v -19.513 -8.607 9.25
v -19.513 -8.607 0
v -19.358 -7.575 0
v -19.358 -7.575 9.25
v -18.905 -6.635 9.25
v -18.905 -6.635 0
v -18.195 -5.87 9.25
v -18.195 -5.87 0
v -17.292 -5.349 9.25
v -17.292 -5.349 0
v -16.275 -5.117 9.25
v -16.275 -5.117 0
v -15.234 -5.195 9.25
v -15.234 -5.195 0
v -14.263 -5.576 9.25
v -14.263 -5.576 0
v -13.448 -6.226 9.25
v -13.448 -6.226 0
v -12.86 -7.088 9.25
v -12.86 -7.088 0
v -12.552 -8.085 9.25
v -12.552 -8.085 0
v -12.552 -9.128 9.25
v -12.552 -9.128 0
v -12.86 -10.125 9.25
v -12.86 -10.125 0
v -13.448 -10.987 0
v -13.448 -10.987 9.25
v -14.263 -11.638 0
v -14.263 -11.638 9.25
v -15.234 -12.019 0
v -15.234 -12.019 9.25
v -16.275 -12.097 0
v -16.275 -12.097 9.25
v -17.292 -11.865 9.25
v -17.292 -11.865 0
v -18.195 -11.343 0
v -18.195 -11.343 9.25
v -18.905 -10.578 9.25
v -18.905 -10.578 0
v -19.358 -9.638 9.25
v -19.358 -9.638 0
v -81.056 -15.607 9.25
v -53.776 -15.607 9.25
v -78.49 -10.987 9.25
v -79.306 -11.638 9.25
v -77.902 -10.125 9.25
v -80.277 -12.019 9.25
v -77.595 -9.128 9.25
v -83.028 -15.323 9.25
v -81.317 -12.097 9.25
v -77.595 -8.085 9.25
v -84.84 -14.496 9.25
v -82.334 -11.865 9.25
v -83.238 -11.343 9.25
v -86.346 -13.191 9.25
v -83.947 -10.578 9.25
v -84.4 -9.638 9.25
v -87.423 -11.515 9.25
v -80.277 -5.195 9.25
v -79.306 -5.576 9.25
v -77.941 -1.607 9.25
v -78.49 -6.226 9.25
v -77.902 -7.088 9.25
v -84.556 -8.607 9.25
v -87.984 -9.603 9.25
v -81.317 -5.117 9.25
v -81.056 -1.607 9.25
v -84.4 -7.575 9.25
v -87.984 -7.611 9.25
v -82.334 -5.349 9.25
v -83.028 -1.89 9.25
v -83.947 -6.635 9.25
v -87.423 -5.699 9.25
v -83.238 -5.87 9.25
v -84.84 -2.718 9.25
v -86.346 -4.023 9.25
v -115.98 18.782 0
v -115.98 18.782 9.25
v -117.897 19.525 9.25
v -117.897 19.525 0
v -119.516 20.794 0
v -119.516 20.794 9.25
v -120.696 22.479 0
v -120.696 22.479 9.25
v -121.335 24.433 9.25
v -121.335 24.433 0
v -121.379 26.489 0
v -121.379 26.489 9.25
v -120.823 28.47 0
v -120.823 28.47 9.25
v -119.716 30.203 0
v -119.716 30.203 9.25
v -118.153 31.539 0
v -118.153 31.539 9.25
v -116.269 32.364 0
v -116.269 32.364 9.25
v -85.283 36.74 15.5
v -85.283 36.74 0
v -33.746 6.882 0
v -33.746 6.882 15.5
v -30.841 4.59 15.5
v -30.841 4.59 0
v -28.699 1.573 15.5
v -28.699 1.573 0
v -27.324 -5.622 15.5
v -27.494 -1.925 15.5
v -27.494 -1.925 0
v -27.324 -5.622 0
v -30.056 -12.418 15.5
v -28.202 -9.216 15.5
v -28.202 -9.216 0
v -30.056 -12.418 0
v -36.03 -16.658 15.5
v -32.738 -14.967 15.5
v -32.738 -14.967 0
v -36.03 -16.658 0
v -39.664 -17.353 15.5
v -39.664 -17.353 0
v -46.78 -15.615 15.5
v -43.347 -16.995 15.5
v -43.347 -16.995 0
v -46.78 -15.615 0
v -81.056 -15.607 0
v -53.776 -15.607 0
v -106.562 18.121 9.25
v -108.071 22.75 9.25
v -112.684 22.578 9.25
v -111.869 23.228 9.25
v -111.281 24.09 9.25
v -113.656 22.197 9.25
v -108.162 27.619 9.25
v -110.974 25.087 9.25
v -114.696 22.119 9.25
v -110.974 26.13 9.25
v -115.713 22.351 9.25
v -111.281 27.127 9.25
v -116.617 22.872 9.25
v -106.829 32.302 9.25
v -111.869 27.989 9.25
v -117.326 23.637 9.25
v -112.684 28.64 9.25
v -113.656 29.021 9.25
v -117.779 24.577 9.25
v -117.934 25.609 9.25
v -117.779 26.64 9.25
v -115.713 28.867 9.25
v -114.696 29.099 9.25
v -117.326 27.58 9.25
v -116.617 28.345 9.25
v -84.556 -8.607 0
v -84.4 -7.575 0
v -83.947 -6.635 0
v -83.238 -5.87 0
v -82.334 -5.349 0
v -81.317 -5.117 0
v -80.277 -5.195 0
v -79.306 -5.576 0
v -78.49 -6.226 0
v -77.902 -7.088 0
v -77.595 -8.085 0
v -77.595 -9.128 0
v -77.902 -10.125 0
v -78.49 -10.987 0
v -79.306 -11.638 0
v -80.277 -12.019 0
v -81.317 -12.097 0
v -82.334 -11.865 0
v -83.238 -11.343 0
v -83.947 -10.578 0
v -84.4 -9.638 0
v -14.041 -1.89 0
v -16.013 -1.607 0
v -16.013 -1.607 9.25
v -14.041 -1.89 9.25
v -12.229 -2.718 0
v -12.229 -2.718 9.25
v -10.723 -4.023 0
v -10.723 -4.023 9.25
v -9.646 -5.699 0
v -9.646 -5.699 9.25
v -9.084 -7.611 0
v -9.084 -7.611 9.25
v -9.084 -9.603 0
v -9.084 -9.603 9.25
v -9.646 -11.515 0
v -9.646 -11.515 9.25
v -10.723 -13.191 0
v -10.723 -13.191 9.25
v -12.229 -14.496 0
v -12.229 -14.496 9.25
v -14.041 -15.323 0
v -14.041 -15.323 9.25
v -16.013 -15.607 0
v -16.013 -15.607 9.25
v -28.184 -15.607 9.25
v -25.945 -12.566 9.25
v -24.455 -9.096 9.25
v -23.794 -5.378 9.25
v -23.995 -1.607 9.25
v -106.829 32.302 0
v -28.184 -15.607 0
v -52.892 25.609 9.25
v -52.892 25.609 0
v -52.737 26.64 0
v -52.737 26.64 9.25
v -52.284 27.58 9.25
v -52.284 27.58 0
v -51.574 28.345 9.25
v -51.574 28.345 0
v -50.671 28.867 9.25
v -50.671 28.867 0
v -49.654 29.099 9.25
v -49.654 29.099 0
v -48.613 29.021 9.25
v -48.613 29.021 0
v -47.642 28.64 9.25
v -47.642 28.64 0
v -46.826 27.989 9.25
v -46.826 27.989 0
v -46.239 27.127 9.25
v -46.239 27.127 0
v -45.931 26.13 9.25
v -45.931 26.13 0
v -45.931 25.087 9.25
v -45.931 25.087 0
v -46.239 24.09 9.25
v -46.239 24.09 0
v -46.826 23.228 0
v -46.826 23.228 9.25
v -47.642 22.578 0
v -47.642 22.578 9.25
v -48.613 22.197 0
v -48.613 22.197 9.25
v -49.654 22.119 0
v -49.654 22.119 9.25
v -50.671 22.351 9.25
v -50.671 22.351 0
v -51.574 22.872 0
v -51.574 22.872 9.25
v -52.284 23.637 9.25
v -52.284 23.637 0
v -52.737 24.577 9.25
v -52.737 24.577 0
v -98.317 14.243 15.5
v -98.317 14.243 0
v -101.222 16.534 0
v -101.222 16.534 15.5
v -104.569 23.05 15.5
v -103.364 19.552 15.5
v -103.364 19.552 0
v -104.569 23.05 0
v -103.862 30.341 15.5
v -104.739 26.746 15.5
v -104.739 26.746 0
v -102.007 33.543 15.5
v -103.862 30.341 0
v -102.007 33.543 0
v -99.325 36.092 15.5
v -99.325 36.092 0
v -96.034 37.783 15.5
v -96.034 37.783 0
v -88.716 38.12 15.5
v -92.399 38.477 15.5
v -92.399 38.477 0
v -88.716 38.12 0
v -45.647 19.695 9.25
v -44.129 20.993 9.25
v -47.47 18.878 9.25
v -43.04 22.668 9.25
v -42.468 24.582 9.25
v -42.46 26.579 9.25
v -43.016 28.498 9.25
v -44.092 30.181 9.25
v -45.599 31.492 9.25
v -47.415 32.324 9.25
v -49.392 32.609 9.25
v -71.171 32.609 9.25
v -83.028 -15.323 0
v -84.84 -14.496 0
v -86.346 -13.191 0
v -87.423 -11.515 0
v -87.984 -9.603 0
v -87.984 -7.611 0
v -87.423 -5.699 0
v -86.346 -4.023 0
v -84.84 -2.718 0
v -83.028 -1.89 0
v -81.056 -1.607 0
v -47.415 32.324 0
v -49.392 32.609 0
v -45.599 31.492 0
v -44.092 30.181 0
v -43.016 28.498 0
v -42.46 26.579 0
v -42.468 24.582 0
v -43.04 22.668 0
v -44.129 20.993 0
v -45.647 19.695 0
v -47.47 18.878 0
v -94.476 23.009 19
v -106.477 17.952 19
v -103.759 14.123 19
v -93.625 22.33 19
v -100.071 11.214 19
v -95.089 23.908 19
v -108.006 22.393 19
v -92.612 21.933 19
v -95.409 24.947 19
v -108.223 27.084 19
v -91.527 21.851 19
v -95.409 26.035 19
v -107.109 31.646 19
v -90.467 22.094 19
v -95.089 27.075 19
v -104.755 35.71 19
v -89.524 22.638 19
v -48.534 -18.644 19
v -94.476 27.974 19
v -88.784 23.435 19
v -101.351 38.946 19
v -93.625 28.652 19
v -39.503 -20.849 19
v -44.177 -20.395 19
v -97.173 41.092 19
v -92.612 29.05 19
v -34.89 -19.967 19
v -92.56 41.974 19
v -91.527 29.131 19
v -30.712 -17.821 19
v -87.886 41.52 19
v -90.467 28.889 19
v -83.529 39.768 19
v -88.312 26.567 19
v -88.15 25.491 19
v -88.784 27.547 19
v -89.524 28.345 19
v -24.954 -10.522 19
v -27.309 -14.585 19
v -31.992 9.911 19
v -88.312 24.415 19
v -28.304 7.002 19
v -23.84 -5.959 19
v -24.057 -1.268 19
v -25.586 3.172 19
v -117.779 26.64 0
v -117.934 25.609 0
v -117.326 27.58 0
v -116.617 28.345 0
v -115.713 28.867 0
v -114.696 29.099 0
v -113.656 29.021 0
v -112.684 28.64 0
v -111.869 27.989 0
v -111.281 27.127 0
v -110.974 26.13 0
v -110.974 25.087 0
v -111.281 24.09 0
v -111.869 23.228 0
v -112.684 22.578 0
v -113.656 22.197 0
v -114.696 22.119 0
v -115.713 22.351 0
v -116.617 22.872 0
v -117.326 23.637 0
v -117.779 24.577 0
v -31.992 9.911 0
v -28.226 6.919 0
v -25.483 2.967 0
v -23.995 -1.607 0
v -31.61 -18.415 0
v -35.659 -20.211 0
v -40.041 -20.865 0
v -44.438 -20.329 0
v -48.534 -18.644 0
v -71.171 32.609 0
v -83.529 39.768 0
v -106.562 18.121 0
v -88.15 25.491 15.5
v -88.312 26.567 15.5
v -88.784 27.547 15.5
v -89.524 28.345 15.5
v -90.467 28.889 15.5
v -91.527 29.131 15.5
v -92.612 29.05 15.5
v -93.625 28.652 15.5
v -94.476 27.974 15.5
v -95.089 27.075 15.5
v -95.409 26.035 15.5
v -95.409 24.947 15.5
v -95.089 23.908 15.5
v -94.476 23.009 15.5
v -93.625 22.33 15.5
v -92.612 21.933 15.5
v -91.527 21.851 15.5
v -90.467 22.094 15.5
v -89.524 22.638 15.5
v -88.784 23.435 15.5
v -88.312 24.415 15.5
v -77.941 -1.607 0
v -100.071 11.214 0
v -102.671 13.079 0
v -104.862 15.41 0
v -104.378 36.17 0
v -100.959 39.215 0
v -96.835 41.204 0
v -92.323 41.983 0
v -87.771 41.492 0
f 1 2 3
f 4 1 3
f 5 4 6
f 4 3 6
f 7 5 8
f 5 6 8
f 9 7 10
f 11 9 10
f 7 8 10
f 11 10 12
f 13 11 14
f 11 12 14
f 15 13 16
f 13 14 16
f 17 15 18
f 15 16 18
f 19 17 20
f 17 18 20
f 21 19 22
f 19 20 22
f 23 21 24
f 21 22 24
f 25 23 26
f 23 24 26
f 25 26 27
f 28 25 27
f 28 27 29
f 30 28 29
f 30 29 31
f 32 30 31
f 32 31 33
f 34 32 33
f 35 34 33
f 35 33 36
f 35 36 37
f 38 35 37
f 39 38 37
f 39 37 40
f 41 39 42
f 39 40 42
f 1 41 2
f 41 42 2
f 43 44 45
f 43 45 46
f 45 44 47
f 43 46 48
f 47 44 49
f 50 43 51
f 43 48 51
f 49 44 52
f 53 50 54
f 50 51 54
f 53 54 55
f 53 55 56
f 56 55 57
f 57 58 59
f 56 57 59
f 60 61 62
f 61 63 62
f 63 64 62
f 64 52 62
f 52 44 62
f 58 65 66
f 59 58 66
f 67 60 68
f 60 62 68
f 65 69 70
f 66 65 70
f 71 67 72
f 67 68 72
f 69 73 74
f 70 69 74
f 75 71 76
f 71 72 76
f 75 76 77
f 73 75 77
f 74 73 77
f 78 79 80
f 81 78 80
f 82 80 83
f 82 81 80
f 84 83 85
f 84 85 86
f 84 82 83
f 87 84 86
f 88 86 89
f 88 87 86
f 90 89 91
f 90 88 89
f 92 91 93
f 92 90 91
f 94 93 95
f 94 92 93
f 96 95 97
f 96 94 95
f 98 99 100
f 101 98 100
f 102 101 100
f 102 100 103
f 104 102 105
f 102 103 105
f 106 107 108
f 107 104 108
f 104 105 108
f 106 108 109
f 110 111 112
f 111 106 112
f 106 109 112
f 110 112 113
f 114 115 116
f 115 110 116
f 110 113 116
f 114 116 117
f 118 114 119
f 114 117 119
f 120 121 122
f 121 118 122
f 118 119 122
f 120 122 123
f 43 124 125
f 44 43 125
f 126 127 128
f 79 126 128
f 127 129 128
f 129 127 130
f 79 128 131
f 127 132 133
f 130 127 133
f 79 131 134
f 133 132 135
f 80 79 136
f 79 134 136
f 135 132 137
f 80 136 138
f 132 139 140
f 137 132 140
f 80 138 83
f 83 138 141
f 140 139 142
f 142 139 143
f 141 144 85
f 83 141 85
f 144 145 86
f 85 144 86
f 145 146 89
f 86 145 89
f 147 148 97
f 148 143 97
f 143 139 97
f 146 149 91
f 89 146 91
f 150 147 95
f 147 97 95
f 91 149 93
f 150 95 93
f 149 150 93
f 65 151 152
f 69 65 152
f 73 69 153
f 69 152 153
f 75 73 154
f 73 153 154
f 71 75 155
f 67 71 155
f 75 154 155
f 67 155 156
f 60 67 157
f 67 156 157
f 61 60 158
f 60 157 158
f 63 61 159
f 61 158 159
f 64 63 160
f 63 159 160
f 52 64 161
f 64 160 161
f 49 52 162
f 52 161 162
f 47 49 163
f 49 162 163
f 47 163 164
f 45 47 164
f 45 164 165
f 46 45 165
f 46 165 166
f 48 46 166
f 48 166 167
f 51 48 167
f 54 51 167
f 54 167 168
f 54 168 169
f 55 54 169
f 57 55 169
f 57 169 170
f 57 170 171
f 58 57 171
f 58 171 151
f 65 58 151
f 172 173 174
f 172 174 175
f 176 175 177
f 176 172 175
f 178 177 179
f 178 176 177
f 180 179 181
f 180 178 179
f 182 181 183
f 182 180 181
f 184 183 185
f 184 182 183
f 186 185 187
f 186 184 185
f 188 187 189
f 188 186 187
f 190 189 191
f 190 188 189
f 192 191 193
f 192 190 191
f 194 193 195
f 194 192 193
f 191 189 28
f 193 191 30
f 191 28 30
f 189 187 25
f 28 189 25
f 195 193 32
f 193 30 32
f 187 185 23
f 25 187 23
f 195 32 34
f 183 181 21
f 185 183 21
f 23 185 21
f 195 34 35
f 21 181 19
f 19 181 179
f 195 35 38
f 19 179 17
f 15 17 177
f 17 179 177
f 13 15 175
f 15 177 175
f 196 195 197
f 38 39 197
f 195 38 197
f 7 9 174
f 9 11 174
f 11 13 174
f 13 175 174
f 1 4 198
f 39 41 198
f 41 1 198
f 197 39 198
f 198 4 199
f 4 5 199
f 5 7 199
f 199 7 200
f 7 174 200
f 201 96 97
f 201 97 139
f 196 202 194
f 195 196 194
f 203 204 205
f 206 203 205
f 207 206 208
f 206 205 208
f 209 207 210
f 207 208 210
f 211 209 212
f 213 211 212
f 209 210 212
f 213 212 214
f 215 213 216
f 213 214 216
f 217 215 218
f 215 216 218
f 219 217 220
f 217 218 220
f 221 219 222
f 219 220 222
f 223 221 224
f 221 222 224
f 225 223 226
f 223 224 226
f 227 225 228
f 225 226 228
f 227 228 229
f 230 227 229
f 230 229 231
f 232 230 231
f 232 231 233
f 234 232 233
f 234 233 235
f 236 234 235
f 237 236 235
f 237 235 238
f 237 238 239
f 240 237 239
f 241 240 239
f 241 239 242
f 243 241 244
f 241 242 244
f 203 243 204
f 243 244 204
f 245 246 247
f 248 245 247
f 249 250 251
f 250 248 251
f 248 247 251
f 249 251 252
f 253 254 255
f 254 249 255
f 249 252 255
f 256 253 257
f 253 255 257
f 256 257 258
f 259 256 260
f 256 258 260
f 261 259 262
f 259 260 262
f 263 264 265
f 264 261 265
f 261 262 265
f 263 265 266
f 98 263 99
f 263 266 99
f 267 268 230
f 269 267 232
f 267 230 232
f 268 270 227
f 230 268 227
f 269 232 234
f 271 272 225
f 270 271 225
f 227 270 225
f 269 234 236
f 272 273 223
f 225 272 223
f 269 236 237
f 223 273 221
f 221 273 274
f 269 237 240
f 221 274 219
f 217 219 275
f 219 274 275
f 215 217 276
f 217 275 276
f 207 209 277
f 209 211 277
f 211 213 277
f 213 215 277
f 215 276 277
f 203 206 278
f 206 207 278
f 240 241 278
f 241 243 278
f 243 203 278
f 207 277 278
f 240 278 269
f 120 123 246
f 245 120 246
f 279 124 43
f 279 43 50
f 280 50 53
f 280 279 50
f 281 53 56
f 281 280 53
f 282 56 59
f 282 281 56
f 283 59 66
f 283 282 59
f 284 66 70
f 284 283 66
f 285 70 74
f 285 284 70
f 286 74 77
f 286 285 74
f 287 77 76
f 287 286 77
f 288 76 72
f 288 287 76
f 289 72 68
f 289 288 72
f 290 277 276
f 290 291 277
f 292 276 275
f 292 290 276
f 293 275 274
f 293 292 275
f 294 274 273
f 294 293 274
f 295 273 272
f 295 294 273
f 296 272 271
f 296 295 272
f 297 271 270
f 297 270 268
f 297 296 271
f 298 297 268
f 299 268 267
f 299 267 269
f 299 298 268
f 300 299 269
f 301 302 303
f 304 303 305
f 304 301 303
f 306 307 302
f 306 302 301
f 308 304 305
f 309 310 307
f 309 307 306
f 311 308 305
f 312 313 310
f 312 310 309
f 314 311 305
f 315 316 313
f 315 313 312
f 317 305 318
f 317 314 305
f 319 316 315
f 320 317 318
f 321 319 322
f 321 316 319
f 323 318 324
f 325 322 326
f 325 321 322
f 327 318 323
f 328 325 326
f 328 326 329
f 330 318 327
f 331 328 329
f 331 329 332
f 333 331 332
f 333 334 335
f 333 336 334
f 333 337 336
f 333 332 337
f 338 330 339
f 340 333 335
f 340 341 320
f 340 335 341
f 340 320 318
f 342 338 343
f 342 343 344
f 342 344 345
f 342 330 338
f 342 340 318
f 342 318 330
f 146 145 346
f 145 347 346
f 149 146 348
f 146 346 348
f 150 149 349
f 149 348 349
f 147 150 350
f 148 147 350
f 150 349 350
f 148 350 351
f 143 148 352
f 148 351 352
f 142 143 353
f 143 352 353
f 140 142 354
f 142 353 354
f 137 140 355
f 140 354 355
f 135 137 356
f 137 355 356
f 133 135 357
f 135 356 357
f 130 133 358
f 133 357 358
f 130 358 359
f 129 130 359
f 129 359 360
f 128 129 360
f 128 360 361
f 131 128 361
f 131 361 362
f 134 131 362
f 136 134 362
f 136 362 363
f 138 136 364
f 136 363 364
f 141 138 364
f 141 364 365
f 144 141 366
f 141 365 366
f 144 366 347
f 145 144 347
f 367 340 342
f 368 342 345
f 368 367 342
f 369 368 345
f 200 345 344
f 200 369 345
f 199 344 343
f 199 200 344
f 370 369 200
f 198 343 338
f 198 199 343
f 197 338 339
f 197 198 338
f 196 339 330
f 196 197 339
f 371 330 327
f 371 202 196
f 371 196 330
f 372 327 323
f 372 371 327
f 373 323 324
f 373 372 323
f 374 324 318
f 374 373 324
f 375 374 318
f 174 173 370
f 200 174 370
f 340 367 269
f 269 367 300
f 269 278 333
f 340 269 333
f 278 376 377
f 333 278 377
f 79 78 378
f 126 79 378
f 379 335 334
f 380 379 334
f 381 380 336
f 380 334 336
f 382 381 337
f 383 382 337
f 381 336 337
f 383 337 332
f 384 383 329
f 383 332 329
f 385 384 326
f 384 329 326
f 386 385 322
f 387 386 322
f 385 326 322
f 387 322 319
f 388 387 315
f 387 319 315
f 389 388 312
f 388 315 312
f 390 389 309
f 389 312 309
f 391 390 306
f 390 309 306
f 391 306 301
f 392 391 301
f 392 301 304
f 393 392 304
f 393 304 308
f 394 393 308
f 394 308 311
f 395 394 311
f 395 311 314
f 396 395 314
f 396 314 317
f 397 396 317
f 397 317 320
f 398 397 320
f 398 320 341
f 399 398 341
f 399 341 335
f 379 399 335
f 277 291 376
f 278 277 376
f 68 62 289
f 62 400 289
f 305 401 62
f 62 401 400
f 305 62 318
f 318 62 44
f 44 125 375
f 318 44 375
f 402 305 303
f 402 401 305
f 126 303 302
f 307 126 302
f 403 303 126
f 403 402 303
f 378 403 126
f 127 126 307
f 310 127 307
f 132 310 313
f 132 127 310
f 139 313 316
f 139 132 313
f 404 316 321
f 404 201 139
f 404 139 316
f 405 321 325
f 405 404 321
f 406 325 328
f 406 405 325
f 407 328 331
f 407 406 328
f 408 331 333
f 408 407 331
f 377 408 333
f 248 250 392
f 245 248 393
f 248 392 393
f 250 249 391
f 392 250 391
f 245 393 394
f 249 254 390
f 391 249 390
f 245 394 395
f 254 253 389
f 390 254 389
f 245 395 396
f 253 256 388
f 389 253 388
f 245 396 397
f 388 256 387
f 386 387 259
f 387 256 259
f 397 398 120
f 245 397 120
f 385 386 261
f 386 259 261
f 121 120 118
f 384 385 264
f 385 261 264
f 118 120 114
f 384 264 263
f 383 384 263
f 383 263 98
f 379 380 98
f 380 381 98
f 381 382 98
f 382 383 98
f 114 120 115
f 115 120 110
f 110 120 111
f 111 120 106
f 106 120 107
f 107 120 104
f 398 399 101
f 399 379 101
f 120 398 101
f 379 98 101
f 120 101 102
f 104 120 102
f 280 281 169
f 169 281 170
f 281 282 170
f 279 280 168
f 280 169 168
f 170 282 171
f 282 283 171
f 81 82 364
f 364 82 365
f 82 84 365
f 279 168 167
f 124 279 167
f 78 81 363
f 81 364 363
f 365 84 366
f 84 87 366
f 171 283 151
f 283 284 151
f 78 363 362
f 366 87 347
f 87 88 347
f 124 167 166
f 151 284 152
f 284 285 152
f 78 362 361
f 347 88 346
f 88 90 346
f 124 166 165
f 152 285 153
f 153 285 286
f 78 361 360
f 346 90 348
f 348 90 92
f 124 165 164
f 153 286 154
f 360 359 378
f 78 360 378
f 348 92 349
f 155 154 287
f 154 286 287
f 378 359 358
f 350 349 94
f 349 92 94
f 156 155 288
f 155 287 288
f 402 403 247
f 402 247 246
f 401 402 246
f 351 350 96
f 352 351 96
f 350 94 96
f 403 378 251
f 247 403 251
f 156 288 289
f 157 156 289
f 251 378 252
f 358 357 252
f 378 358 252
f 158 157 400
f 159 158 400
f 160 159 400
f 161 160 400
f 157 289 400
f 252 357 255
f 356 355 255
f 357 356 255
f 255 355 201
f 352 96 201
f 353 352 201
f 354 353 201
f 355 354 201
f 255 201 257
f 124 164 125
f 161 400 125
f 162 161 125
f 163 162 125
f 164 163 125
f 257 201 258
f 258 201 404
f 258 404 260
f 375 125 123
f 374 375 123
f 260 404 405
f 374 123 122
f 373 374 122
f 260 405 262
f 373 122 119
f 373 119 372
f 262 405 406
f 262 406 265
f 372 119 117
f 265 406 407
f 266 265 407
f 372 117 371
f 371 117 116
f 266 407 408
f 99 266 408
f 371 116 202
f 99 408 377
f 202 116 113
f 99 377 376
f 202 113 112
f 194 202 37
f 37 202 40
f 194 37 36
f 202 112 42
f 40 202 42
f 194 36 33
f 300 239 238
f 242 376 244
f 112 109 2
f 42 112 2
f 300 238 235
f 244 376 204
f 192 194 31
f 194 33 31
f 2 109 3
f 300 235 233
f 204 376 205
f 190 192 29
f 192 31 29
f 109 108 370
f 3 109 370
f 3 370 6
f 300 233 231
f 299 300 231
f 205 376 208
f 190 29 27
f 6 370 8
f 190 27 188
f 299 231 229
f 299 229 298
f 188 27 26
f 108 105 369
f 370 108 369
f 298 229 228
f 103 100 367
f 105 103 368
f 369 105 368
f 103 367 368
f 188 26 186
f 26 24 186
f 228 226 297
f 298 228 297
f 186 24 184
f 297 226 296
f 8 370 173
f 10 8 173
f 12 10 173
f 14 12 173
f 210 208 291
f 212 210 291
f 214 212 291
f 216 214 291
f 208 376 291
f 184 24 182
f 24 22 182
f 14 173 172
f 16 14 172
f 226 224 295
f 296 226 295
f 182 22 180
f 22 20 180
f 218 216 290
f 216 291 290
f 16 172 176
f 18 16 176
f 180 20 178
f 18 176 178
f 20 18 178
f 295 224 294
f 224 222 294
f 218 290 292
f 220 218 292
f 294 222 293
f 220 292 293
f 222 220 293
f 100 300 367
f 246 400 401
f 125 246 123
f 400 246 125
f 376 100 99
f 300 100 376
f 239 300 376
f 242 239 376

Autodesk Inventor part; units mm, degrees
ref_plane "YZ Plane" through (0, 0, 0) normal (1, 0, 0) x (0, 1, 0)
ref_plane "XZ Plane" through (0, 0, 0) normal (0, 1, 0) x (-1, 0, 0)
ref_plane "XY Plane" through (0, 0, 0) normal (0, 0, 1) x (1, 0, 0)
sketch "Sketch1" plane through (0, 0, 0) normal (0, 0, 1) x (1, 0, 0)
  line L0 (-103.0486, 32.008) -> (-29.0145, -10.8833) construction
  line L1 (-85.2832, 36.7398) -> (-33.7462, 6.8821)
  line L2 (-46.7799, -15.6151) -> (-98.3168, 14.2426)
  arc A0 (-85.2832, 36.7398) -> (-98.3168, 14.2426) centre (-91.8, 25.4912) ccw
  arc A1 (-46.7799, -15.6151) -> (-33.7462, 6.8821) centre (-40.2631, -4.3665) ccw
  circle A2 centre (-91.8, 25.4912) radius 4.5363 construction
  circle A3 centre (-43.5, -2.4912) radius 4.2314 construction
  line L3 (7.6716, 38.4912) -> (-163.6716, 38.4912) construction
  line L4 (-100.0713, 11.2141) -> (-48.5344, -18.6435)
  arc A4 (-48.5344, -18.6435) -> (-31.9917, 9.9106) centre (-40.2631, -4.3665) ccw
  line L5 (-31.9917, 9.9106) -> (-83.5287, 39.7682)
  arc A5 (-83.5287, 39.7682) -> (-100.0713, 11.2141) centre (-91.8, 25.4912) ccw
  point P0 (0, 0)
  point P1 (-66.0315, 10.5623)
  dimension "d0" = 3.5
extrude "Extrusion1" add sketch "Sketch1" along normal blind 15.5
sketch "Sketch2" plane through (0, 0, 15.5) normal (0, 0, 1) x (1, 0, 0)
  arc A0 (-83.5287, 39.7682) -> (-100.0713, 11.2141) centre (-91.8, 25.4912) ccw projected
  line L0 (-31.9917, 9.9106) -> (-83.5287, 39.7682) projected
  arc A1 (-48.5344, -18.6435) -> (-31.9917, 9.9106) centre (-40.2631, -4.3665) ccw projected
  line L1 (-100.0713, 11.2141) -> (-48.5344, -18.6435) projected
  point P0 (0, 0)
extrude "Extrusion2" add sketch "Sketch2" along normal blind 3.5
sketch "Sketch3" plane through (0, 0, 19) normal (0, 0, 1) x (1, 0, 0)
  circle A0 centre (-91.8, 25.4912) radius 2.5 construction
  circle A1 centre (-91.8, 25.4912) radius 3.65
  point P0 (0, 0)
  dimension "d5" = 7.3
extrude "Extrusion3" cut sketch "Sketch3" against normal through all
sketch "Sketch4" plane through (0, 0, 0) normal (0, 0, -1) x (-1, 0, 0)
  line L0 (121.4345, 25.6088) -> (42.3921, 25.6088) construction
  arc A0 (115.98, 18.7815) -> (116.2693, 32.3641) centre (114.4345, 25.6088) ccw
  arc A1 (49.3921, 32.6088) -> (49.3921, 18.6088) centre (49.3921, 25.6088) ccw
  circle A2 centre (114.4345, 25.6088) radius 3.5
  circle A3 centre (49.3921, 25.6088) radius 3.5
  line L1 (31.9917, 9.9106) -> (83.5287, 39.7682) projected
  line L2 (100.0713, 11.2141) -> (48.5344, -18.6435) projected
  arc A4 (100.0713, 11.2141) -> (83.5287, 39.7682) centre (91.8, 25.4912) ccw projected
  arc A5 (31.9917, 9.9106) -> (48.5344, -18.6435) centre (40.2631, -4.3665) ccw projected
  line L3 (116.2693, 32.3641) -> (106.8288, 32.3018)
  line L4 (115.98, 18.7815) -> (106.5624, 18.1208)
  line L5 (49.3921, 32.6088) -> (71.1708, 32.6088)
  line L6 (9.0132, -8.6068) -> (88.0556, -8.6068) construction
  line L7 (16.0132, -1.6068) -> (81.0556, -1.6068)
  line L8 (81.0556, -15.6068) -> (16.0132, -15.6068)
  arc A6 (16.0132, -1.6068) -> (16.0132, -15.6068) centre (16.0132, -8.6068) ccw
  arc A7 (81.0556, -15.6068) -> (81.0556, -1.6068) centre (81.0556, -8.6068) ccw
  circle A8 centre (16.0132, -8.6068) radius 3.5
  circle A9 centre (81.0556, -8.6068) radius 3.5
  point P0 (0, 0)
  point P1 (81.9133, 25.6088)
  point P2 (47.47, 18.8779)
  point P3 (48.5344, -8.6068)
  point P4 (77.9414, -1.6068)
  point P5 (53.7761, -15.6068)
  point P6 (28.1839, -15.6068)
  point P7 (23.9955, -1.6068)
  dimension "d8" = 7
  dimension "d9" = 7
  dimension "d12" = 65.0425
  dimension "d13" = 65.0425
  dimension "d14" = 7
  dimension "d15" = 7
  dimension "d16" = 7
  dimension "d17" = 7
  dimension "d18" = 7
extrude "Extrusion4" add sketch "Sketch4" against normal blind 9.25 contours L4 A4 L3 A0 | L7 A7 L8 L2 | L1 A1 L5 | A5 L8 A6 L7
equation "\"d13\" = d12"
equation "\"d14\" = d15"
equation "\"d16\" = d15"
properties part number "Y belt Cover"
